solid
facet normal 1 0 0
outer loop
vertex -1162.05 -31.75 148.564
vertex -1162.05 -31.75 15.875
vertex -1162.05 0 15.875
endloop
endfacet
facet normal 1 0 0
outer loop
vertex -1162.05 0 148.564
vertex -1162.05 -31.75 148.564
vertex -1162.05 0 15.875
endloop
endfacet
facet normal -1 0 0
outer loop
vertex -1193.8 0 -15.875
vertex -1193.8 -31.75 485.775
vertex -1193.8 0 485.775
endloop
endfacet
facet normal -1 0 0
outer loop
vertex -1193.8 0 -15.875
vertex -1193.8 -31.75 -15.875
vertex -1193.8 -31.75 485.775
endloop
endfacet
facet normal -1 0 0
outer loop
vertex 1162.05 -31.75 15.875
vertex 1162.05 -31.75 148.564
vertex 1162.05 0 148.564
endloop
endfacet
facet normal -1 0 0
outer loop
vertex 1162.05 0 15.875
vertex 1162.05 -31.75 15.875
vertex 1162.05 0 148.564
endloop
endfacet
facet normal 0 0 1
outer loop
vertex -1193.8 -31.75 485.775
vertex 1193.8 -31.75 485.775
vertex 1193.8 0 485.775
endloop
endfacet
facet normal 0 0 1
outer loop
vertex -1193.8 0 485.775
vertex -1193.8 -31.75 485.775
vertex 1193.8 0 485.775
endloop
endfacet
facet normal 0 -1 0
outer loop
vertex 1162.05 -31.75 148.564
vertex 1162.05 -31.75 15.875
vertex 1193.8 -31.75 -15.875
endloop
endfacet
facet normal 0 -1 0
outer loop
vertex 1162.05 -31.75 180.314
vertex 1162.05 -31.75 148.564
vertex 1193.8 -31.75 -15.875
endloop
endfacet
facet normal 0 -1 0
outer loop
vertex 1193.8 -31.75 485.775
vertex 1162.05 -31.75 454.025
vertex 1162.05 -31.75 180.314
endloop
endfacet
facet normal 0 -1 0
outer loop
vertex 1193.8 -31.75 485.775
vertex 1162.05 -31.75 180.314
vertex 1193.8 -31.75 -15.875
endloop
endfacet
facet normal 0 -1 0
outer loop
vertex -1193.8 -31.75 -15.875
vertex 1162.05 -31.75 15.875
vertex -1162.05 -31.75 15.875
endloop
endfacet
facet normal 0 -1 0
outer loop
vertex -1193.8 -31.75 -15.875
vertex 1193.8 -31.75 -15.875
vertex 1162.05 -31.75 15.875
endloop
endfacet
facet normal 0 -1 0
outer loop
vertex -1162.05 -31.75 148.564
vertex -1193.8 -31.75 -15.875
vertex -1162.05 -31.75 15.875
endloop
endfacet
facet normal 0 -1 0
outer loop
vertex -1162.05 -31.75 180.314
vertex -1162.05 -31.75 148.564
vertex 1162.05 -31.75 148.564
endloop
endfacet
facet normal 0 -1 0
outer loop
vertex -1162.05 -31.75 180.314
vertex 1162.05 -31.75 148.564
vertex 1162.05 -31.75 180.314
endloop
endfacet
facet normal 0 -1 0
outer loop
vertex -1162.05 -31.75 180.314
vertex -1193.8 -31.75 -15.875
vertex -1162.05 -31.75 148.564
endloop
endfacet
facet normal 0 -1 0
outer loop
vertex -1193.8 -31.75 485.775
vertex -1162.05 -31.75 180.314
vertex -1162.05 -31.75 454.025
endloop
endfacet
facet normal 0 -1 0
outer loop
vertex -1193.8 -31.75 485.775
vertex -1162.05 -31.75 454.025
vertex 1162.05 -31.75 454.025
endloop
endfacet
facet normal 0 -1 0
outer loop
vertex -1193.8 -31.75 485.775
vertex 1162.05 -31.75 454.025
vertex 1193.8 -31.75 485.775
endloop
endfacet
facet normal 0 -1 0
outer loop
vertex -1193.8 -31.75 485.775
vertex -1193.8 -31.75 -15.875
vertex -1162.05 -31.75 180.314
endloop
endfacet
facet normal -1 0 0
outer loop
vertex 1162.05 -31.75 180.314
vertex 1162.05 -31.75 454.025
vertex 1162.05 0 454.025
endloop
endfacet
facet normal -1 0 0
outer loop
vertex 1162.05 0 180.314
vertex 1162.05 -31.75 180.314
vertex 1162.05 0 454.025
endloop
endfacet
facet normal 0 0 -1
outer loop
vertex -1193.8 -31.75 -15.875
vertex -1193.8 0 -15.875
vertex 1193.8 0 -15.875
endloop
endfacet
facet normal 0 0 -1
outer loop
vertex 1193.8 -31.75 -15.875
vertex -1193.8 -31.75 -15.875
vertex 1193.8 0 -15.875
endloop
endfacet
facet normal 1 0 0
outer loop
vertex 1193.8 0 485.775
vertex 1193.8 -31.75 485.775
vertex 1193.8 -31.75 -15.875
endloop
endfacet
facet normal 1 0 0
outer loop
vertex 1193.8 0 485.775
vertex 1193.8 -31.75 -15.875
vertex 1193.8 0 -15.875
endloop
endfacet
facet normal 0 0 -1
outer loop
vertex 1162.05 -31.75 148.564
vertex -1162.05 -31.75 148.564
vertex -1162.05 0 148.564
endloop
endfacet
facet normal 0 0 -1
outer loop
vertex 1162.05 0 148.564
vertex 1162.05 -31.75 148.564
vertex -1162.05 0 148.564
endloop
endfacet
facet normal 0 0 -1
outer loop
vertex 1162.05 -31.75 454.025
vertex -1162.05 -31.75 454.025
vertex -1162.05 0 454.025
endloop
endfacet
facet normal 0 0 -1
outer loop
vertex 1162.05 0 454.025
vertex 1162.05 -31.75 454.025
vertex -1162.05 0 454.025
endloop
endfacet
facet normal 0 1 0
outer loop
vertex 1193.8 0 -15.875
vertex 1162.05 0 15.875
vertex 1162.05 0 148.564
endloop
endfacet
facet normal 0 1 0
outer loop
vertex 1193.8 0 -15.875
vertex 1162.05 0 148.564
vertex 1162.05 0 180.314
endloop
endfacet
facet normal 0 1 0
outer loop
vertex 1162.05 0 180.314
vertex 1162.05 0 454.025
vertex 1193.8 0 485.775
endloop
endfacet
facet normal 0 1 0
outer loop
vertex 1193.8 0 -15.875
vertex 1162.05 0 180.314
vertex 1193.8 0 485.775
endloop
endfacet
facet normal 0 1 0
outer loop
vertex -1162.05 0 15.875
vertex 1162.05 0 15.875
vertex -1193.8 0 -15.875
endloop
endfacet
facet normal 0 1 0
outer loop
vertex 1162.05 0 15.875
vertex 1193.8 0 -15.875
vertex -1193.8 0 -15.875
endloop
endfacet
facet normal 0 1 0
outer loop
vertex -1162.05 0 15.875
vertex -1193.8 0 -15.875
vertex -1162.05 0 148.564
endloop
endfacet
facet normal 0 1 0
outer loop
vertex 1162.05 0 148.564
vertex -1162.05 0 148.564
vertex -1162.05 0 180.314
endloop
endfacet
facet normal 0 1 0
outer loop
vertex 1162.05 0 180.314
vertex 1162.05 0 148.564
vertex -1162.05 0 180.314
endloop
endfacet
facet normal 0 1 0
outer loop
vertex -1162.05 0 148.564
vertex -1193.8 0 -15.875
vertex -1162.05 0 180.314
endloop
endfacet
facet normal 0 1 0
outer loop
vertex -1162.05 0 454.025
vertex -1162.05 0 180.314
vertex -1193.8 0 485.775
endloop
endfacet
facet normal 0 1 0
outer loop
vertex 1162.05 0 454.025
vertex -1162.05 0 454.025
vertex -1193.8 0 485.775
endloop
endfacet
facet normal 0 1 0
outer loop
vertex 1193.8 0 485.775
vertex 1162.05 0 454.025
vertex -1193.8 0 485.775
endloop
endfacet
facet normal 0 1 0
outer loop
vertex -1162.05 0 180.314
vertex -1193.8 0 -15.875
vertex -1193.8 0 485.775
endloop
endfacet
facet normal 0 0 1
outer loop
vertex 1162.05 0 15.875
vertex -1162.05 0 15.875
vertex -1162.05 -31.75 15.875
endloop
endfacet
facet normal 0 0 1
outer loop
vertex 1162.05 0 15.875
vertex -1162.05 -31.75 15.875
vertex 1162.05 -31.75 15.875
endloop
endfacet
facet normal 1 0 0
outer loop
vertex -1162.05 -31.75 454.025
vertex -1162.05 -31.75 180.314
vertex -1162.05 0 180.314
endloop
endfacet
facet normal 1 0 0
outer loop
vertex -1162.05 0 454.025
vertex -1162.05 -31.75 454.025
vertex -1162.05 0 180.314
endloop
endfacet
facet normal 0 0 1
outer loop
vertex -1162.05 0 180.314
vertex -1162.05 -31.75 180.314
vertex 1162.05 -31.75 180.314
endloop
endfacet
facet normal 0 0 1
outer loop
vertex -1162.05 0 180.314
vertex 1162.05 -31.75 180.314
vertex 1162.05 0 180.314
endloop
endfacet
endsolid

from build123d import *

# Parameters (mm, degrees)
F0_W     = 2387.6
F0_H     = 31.75
F1_DEPTH = 31.75
F2_W     = 31.75
F2_H     = 31.75
F3_DEPTH = 469.9
F4_W     = 31.75
F4_H     = 31.75
F5_DEPTH = 2355.85
F6_W     = 31.75
F6_H     = 31.75
F7_DEPTH = 501.65
F8_W     = 31.75
F8_H     = 31.75
F9_DEPTH = 2336.8


with BuildPart() as f1:
    # F0 (on Front) → F1 (new body)
    with BuildSketch(Plane.XZ):
        Rectangle(F0_W, F0_H)
    extrude(amount=F1_DEPTH)

    # F2 (on face) → F3 (join)
    with BuildSketch(Plane.XY.offset(15.875)):
        with Locations((-1177.925, -15.875)):
            Rectangle(F2_W, F2_H)
    extrude(amount=F3_DEPTH)

    # F4 (on face) → F5 (join)
    with BuildSketch(Plane.YZ.offset(-1162.05)):
        with Locations((-15.875, 469.9)):
            Rectangle(F4_W, F4_H)
    extrude(amount=F5_DEPTH)

    # F6 (on face) → F7 (join)
    with BuildSketch(Plane.XY.offset(485.775)):
        with Locations((1177.925, -15.875)):
            Rectangle(F6_W, F6_H)
    extrude(amount=-F7_DEPTH)

    # F8 (on face) → F9 (join)
    with BuildSketch(Plane.YZ.offset(-1162.05)):
        with Locations((-15.875, 164.438751)):
            Rectangle(F8_W, F8_H)
    extrude(amount=F9_DEPTH)


solid = f1.part
